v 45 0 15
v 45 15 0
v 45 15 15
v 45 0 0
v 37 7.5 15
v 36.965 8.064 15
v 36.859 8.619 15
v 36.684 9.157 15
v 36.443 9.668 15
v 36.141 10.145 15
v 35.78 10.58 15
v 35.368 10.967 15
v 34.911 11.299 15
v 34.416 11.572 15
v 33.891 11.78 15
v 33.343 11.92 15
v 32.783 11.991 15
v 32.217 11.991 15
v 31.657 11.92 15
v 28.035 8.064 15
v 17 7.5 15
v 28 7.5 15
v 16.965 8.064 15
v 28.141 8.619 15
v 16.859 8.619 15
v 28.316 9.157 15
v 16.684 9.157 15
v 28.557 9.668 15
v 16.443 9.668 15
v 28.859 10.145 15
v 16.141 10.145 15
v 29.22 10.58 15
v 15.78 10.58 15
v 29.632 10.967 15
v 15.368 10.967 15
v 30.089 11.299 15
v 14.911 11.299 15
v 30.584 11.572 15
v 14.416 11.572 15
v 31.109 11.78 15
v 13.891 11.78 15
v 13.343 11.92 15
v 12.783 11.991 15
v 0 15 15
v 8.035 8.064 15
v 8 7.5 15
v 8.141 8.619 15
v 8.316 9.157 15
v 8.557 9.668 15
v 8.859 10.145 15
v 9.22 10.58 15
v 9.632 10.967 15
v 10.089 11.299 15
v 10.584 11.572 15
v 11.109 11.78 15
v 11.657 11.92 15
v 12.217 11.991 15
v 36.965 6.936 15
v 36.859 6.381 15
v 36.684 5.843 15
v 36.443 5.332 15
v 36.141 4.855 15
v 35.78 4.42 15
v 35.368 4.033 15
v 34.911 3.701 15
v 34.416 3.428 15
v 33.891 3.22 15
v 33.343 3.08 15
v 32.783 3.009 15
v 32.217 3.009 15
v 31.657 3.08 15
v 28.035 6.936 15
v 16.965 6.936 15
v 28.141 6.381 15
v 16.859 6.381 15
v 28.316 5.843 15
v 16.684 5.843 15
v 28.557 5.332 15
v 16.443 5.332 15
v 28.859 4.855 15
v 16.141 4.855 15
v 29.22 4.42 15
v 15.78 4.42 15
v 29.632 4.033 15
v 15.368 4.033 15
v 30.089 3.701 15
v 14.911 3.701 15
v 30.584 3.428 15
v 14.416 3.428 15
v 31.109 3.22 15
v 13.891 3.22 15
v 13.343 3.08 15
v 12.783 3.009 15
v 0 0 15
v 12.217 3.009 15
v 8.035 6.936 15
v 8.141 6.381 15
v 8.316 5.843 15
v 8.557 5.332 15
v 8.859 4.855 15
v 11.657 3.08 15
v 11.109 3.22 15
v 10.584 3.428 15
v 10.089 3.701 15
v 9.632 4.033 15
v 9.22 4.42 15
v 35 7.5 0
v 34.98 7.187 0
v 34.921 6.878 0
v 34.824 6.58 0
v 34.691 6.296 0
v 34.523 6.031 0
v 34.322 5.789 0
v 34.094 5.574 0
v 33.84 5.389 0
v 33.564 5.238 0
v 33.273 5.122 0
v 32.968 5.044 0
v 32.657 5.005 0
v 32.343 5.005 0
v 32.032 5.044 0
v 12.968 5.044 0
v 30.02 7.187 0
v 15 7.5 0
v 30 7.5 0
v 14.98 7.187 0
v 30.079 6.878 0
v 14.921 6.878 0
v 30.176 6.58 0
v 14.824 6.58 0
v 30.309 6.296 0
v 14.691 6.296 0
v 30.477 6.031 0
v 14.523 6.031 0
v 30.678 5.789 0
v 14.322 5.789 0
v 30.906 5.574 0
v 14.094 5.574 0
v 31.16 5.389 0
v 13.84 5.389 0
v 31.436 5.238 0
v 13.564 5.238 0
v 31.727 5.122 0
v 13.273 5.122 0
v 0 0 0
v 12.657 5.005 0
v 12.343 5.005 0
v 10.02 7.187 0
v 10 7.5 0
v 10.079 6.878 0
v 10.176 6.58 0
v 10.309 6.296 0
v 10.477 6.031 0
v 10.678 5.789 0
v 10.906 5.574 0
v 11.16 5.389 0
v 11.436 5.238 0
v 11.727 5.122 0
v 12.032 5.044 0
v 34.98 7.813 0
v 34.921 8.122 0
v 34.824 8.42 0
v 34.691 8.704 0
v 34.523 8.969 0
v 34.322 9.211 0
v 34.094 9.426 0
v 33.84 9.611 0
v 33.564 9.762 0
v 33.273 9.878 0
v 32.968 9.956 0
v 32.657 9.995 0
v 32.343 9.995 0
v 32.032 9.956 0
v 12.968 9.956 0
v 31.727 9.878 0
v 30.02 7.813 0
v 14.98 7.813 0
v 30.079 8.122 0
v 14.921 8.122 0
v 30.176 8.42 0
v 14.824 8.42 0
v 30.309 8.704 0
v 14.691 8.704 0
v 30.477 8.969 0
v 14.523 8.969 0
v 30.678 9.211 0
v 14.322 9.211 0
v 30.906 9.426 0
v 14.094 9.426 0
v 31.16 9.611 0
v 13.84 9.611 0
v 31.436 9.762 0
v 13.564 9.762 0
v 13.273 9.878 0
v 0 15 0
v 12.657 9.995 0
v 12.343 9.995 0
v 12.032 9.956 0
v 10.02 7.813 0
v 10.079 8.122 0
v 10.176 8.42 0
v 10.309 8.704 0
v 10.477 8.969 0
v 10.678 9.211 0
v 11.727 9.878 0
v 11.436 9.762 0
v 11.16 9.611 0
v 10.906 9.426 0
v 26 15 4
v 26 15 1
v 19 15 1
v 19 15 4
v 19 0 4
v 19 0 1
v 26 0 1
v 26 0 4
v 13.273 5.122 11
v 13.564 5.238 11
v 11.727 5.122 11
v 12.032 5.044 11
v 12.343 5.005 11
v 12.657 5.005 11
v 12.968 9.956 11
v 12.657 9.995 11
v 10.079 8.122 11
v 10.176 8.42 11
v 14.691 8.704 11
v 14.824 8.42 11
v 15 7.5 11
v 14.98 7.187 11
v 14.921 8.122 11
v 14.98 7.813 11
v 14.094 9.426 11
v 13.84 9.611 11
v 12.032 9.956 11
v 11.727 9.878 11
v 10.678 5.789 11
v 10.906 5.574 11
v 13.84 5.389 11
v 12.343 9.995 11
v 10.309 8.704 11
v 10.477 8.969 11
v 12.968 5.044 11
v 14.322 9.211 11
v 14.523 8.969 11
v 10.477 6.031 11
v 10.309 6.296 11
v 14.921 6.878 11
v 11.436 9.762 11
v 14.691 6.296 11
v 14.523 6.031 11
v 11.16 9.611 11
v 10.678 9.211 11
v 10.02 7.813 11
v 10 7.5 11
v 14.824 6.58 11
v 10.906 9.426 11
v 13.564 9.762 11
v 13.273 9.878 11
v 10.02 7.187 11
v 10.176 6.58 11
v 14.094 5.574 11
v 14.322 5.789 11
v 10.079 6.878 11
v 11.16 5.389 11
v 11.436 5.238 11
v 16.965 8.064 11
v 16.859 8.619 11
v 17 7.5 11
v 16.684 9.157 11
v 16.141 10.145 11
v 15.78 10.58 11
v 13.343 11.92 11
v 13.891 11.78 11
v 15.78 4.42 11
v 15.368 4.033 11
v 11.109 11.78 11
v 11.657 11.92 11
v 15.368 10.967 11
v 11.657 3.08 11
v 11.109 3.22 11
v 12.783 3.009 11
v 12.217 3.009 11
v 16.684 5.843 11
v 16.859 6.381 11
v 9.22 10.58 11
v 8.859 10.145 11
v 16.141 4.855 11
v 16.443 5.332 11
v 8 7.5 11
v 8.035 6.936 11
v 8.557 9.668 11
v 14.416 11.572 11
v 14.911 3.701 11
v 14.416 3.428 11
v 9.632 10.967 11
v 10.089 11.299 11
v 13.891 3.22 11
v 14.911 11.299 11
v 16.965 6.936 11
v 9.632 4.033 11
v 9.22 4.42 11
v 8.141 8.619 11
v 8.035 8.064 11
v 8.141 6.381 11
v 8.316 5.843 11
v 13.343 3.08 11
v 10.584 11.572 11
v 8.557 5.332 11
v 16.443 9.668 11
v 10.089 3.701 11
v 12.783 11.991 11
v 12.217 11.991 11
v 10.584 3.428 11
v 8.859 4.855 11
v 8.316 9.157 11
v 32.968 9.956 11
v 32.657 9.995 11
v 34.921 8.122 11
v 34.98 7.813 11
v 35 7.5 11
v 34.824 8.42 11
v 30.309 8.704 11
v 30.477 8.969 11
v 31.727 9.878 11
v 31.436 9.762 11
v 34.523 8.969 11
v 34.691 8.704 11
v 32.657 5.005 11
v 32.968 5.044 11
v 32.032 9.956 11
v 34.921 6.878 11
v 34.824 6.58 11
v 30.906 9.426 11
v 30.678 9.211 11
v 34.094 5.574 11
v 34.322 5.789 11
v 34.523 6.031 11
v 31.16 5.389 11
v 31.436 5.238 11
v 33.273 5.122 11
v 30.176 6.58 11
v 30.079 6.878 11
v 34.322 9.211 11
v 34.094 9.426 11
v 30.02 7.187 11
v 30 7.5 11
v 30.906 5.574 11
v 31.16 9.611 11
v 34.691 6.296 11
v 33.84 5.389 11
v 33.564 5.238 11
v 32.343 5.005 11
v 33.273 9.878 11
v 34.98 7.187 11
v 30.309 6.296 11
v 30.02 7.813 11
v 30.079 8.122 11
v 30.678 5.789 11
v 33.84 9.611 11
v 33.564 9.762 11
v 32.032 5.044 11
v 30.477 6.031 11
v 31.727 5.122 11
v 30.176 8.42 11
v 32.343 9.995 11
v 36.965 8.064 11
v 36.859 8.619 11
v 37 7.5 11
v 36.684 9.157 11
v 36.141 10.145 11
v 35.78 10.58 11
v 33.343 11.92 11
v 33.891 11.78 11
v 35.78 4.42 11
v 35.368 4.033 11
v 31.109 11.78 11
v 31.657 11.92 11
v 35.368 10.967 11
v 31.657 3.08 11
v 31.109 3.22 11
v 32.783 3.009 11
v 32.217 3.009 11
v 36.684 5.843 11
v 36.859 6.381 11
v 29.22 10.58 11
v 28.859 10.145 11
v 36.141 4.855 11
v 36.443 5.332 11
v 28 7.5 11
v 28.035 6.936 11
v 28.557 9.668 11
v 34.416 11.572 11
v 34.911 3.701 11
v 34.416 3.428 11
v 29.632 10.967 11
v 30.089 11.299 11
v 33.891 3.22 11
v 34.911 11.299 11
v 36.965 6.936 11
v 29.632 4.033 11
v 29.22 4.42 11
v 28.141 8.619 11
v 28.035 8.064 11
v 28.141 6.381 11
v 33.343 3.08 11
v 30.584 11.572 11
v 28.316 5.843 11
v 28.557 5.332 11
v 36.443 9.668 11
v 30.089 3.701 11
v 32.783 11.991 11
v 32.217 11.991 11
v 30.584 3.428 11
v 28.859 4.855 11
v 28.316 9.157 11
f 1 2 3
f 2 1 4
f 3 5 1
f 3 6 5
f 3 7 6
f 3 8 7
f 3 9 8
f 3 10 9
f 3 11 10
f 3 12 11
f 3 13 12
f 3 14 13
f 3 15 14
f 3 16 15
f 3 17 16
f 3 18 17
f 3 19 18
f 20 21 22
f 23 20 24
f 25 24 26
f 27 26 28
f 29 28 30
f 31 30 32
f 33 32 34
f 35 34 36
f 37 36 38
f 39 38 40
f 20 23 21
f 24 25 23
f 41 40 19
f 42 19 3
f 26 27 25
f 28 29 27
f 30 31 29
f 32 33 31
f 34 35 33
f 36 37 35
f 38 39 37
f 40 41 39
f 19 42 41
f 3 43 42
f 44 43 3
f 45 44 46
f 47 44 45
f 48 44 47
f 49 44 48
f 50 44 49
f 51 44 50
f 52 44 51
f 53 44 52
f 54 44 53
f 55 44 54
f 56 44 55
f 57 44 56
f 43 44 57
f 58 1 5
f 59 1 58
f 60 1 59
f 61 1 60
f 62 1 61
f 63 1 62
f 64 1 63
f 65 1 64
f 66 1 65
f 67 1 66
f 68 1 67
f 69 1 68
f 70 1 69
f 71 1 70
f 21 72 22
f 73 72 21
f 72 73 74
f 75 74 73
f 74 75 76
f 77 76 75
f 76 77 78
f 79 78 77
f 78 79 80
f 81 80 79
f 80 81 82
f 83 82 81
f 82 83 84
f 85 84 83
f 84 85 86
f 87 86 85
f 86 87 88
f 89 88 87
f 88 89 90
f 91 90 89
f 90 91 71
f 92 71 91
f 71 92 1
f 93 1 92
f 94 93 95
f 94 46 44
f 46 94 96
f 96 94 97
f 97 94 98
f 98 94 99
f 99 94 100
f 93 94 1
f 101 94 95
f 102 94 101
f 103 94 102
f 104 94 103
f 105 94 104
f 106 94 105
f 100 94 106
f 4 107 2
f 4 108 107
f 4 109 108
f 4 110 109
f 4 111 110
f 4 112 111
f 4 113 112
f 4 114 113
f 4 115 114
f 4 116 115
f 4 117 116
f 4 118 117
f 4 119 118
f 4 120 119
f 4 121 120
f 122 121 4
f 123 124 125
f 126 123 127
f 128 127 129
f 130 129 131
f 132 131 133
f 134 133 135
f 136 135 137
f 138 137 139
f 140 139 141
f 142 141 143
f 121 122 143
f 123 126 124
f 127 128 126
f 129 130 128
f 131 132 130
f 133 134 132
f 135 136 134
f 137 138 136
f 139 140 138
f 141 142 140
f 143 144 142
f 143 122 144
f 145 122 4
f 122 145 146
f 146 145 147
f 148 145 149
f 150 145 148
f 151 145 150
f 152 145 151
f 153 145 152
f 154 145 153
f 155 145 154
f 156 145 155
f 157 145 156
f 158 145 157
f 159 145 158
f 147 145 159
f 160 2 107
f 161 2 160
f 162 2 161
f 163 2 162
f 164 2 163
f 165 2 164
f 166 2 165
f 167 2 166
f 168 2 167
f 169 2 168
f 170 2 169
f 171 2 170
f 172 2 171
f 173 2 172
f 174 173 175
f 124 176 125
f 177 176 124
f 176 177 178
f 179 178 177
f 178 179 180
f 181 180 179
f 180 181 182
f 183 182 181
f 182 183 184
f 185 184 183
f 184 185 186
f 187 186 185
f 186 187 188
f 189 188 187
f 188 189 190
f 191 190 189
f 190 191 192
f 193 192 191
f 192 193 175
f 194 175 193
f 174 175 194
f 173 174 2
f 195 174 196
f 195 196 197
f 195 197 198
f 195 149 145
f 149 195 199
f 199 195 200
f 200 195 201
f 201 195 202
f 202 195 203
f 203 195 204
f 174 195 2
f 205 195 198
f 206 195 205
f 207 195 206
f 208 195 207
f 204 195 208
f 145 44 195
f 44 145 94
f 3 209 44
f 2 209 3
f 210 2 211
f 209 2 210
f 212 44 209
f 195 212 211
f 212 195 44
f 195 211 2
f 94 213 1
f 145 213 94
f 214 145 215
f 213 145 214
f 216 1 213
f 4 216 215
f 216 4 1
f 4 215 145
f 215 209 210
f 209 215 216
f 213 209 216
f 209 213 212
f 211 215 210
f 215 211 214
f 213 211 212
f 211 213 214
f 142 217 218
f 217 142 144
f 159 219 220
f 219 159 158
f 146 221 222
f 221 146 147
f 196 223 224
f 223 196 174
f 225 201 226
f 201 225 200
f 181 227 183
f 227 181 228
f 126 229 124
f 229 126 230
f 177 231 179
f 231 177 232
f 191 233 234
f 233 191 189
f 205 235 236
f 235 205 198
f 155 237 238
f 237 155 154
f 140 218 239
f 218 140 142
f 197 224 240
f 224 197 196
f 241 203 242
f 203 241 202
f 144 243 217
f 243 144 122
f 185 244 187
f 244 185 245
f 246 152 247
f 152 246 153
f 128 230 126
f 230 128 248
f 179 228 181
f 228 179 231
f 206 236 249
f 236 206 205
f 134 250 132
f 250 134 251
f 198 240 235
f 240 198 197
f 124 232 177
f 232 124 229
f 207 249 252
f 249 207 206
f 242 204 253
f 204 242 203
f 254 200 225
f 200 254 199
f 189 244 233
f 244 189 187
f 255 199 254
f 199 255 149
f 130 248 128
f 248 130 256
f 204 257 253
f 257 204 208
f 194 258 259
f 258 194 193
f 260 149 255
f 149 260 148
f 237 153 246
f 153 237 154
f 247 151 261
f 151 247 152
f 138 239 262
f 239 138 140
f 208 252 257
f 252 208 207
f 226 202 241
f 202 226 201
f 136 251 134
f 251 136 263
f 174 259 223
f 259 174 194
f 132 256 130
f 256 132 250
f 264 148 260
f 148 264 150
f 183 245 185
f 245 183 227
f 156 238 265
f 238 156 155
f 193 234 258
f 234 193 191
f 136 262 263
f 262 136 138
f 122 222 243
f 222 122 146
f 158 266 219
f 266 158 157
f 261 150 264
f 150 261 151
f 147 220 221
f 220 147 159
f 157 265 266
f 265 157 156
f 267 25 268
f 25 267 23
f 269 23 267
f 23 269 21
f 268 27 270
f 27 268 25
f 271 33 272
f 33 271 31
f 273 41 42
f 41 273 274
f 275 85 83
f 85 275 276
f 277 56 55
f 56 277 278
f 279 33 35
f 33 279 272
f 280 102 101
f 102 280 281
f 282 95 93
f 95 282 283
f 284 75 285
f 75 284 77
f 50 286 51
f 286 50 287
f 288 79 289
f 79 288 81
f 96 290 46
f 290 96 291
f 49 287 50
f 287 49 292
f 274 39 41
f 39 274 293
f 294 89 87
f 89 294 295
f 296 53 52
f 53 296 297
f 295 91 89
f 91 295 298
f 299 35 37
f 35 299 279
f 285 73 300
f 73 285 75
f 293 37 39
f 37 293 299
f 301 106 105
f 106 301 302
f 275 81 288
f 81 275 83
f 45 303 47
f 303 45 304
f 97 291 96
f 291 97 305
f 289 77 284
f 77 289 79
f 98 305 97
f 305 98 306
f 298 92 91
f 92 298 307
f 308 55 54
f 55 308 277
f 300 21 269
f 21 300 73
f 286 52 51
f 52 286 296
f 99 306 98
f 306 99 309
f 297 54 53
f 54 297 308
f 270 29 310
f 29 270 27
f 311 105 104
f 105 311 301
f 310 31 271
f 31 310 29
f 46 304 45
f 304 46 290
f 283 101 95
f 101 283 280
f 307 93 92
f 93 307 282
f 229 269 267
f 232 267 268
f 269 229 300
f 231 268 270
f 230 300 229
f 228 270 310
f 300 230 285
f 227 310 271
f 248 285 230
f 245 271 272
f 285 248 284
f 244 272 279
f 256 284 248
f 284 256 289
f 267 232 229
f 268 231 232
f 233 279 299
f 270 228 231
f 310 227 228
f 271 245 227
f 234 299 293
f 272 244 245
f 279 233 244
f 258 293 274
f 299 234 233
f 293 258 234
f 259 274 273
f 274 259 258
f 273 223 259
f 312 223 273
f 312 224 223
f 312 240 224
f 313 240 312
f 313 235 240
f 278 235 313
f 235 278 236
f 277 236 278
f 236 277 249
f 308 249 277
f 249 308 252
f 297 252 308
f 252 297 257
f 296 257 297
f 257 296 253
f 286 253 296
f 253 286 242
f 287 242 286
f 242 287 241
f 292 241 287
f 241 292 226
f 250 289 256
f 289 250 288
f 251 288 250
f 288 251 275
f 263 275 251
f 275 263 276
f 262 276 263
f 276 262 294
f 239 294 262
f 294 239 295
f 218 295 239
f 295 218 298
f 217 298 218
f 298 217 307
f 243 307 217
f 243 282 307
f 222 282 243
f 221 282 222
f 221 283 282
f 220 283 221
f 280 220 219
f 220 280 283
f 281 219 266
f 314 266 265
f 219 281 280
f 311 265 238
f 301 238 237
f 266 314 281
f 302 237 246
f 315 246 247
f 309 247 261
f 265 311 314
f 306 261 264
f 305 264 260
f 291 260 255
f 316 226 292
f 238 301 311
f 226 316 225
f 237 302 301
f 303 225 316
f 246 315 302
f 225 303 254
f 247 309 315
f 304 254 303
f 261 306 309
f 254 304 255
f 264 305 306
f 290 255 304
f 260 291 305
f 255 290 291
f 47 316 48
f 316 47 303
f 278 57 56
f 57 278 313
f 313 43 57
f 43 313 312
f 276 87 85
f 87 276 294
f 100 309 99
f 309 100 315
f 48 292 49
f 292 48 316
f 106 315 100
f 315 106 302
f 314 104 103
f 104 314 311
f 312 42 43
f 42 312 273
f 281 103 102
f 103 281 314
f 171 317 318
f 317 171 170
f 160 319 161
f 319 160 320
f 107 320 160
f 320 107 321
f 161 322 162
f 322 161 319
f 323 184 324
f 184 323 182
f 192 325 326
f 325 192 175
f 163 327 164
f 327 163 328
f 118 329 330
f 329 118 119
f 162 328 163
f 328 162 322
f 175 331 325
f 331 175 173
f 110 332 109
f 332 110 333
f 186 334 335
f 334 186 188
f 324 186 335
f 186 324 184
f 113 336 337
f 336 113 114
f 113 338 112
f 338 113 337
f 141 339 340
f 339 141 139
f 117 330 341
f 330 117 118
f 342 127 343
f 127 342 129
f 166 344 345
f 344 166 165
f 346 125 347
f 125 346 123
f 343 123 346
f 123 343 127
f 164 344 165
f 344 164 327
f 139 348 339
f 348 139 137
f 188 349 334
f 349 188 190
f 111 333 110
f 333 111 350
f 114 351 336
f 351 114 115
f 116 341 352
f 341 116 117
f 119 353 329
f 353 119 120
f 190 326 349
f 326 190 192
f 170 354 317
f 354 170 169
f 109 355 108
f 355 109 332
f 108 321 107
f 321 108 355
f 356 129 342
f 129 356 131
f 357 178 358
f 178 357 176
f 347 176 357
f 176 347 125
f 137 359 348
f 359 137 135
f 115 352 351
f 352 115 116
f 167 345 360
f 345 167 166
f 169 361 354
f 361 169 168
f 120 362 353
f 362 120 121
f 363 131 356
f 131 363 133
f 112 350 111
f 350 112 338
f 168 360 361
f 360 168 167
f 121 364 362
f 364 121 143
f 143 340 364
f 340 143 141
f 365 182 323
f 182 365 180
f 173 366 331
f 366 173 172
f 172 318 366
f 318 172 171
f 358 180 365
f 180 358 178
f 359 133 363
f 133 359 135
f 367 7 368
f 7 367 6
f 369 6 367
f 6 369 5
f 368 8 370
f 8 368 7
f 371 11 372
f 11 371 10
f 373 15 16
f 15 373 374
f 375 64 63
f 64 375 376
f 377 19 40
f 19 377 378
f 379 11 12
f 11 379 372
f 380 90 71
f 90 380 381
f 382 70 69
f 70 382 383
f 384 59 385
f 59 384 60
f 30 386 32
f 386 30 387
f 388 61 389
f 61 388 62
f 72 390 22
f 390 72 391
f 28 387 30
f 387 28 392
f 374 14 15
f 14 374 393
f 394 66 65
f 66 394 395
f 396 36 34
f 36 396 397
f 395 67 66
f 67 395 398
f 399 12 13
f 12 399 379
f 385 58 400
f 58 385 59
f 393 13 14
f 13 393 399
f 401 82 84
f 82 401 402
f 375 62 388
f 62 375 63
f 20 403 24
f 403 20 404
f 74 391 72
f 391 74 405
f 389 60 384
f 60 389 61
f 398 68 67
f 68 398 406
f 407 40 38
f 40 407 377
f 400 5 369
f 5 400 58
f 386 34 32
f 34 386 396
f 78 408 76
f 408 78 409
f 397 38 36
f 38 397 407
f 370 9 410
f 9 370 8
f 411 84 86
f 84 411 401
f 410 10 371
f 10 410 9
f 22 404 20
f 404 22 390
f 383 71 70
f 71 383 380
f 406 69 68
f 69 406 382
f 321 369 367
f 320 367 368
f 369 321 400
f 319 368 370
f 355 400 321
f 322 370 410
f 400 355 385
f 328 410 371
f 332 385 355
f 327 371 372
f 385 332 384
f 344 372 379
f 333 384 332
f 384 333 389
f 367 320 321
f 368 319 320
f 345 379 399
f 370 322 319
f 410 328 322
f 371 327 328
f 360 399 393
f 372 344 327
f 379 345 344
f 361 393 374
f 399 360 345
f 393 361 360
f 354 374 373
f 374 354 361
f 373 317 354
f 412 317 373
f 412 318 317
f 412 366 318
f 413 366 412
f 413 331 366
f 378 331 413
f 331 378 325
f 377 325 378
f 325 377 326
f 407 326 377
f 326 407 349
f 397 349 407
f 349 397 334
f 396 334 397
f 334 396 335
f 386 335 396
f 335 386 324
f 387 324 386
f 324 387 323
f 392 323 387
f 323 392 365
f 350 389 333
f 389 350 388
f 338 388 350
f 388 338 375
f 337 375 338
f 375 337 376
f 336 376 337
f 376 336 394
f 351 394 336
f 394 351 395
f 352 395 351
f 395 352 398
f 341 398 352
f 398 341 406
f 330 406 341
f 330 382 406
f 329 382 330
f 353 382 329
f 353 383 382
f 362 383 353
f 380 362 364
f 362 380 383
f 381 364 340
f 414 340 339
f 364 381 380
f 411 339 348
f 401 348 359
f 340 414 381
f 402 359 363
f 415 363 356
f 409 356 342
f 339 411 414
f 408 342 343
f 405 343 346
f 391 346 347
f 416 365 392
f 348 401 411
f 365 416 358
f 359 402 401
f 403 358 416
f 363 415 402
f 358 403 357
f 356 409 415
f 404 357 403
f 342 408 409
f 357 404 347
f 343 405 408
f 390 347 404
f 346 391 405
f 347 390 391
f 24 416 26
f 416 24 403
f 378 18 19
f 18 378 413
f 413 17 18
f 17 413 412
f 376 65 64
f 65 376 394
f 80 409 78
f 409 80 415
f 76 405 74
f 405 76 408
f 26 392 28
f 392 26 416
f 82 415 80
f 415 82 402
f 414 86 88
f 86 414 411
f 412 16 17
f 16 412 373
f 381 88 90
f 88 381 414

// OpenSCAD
w = 45;
l = 15;
h = 15;
strap_h = 3;
strap_w = 7;
strap_inset = 1;

head_d = 9;
body_d = 5;
hole_dist = 20;
hole_inset = 4;

difference(){
    cube( [ w, l, h ] );
    
    translate( [ w / 2 - strap_w / 2, -1, strap_inset ] )
        cube( [ strap_w, l + 2, strap_h ] );    
    
    translate( [ w / 2 - hole_dist / 2, l / 2, -1 ] )
        cylinder( d = body_d, h = h + 2, $fn = 50 );
    translate( [ w / 2 - hole_dist / 2, l / 2, h - hole_inset ] )
        cylinder( d = head_d, h = h + 2, $fn = 50 );

    translate( [ w / 2 + hole_dist / 2, l / 2, -1 ] )
        cylinder( d = body_d, h = h + 2, $fn = 50 );
    translate( [ w / 2 + hole_dist / 2, l / 2, h - hole_inset ] )
        cylinder( d = head_d, h = h + 2, $fn = 50 );
    
}
